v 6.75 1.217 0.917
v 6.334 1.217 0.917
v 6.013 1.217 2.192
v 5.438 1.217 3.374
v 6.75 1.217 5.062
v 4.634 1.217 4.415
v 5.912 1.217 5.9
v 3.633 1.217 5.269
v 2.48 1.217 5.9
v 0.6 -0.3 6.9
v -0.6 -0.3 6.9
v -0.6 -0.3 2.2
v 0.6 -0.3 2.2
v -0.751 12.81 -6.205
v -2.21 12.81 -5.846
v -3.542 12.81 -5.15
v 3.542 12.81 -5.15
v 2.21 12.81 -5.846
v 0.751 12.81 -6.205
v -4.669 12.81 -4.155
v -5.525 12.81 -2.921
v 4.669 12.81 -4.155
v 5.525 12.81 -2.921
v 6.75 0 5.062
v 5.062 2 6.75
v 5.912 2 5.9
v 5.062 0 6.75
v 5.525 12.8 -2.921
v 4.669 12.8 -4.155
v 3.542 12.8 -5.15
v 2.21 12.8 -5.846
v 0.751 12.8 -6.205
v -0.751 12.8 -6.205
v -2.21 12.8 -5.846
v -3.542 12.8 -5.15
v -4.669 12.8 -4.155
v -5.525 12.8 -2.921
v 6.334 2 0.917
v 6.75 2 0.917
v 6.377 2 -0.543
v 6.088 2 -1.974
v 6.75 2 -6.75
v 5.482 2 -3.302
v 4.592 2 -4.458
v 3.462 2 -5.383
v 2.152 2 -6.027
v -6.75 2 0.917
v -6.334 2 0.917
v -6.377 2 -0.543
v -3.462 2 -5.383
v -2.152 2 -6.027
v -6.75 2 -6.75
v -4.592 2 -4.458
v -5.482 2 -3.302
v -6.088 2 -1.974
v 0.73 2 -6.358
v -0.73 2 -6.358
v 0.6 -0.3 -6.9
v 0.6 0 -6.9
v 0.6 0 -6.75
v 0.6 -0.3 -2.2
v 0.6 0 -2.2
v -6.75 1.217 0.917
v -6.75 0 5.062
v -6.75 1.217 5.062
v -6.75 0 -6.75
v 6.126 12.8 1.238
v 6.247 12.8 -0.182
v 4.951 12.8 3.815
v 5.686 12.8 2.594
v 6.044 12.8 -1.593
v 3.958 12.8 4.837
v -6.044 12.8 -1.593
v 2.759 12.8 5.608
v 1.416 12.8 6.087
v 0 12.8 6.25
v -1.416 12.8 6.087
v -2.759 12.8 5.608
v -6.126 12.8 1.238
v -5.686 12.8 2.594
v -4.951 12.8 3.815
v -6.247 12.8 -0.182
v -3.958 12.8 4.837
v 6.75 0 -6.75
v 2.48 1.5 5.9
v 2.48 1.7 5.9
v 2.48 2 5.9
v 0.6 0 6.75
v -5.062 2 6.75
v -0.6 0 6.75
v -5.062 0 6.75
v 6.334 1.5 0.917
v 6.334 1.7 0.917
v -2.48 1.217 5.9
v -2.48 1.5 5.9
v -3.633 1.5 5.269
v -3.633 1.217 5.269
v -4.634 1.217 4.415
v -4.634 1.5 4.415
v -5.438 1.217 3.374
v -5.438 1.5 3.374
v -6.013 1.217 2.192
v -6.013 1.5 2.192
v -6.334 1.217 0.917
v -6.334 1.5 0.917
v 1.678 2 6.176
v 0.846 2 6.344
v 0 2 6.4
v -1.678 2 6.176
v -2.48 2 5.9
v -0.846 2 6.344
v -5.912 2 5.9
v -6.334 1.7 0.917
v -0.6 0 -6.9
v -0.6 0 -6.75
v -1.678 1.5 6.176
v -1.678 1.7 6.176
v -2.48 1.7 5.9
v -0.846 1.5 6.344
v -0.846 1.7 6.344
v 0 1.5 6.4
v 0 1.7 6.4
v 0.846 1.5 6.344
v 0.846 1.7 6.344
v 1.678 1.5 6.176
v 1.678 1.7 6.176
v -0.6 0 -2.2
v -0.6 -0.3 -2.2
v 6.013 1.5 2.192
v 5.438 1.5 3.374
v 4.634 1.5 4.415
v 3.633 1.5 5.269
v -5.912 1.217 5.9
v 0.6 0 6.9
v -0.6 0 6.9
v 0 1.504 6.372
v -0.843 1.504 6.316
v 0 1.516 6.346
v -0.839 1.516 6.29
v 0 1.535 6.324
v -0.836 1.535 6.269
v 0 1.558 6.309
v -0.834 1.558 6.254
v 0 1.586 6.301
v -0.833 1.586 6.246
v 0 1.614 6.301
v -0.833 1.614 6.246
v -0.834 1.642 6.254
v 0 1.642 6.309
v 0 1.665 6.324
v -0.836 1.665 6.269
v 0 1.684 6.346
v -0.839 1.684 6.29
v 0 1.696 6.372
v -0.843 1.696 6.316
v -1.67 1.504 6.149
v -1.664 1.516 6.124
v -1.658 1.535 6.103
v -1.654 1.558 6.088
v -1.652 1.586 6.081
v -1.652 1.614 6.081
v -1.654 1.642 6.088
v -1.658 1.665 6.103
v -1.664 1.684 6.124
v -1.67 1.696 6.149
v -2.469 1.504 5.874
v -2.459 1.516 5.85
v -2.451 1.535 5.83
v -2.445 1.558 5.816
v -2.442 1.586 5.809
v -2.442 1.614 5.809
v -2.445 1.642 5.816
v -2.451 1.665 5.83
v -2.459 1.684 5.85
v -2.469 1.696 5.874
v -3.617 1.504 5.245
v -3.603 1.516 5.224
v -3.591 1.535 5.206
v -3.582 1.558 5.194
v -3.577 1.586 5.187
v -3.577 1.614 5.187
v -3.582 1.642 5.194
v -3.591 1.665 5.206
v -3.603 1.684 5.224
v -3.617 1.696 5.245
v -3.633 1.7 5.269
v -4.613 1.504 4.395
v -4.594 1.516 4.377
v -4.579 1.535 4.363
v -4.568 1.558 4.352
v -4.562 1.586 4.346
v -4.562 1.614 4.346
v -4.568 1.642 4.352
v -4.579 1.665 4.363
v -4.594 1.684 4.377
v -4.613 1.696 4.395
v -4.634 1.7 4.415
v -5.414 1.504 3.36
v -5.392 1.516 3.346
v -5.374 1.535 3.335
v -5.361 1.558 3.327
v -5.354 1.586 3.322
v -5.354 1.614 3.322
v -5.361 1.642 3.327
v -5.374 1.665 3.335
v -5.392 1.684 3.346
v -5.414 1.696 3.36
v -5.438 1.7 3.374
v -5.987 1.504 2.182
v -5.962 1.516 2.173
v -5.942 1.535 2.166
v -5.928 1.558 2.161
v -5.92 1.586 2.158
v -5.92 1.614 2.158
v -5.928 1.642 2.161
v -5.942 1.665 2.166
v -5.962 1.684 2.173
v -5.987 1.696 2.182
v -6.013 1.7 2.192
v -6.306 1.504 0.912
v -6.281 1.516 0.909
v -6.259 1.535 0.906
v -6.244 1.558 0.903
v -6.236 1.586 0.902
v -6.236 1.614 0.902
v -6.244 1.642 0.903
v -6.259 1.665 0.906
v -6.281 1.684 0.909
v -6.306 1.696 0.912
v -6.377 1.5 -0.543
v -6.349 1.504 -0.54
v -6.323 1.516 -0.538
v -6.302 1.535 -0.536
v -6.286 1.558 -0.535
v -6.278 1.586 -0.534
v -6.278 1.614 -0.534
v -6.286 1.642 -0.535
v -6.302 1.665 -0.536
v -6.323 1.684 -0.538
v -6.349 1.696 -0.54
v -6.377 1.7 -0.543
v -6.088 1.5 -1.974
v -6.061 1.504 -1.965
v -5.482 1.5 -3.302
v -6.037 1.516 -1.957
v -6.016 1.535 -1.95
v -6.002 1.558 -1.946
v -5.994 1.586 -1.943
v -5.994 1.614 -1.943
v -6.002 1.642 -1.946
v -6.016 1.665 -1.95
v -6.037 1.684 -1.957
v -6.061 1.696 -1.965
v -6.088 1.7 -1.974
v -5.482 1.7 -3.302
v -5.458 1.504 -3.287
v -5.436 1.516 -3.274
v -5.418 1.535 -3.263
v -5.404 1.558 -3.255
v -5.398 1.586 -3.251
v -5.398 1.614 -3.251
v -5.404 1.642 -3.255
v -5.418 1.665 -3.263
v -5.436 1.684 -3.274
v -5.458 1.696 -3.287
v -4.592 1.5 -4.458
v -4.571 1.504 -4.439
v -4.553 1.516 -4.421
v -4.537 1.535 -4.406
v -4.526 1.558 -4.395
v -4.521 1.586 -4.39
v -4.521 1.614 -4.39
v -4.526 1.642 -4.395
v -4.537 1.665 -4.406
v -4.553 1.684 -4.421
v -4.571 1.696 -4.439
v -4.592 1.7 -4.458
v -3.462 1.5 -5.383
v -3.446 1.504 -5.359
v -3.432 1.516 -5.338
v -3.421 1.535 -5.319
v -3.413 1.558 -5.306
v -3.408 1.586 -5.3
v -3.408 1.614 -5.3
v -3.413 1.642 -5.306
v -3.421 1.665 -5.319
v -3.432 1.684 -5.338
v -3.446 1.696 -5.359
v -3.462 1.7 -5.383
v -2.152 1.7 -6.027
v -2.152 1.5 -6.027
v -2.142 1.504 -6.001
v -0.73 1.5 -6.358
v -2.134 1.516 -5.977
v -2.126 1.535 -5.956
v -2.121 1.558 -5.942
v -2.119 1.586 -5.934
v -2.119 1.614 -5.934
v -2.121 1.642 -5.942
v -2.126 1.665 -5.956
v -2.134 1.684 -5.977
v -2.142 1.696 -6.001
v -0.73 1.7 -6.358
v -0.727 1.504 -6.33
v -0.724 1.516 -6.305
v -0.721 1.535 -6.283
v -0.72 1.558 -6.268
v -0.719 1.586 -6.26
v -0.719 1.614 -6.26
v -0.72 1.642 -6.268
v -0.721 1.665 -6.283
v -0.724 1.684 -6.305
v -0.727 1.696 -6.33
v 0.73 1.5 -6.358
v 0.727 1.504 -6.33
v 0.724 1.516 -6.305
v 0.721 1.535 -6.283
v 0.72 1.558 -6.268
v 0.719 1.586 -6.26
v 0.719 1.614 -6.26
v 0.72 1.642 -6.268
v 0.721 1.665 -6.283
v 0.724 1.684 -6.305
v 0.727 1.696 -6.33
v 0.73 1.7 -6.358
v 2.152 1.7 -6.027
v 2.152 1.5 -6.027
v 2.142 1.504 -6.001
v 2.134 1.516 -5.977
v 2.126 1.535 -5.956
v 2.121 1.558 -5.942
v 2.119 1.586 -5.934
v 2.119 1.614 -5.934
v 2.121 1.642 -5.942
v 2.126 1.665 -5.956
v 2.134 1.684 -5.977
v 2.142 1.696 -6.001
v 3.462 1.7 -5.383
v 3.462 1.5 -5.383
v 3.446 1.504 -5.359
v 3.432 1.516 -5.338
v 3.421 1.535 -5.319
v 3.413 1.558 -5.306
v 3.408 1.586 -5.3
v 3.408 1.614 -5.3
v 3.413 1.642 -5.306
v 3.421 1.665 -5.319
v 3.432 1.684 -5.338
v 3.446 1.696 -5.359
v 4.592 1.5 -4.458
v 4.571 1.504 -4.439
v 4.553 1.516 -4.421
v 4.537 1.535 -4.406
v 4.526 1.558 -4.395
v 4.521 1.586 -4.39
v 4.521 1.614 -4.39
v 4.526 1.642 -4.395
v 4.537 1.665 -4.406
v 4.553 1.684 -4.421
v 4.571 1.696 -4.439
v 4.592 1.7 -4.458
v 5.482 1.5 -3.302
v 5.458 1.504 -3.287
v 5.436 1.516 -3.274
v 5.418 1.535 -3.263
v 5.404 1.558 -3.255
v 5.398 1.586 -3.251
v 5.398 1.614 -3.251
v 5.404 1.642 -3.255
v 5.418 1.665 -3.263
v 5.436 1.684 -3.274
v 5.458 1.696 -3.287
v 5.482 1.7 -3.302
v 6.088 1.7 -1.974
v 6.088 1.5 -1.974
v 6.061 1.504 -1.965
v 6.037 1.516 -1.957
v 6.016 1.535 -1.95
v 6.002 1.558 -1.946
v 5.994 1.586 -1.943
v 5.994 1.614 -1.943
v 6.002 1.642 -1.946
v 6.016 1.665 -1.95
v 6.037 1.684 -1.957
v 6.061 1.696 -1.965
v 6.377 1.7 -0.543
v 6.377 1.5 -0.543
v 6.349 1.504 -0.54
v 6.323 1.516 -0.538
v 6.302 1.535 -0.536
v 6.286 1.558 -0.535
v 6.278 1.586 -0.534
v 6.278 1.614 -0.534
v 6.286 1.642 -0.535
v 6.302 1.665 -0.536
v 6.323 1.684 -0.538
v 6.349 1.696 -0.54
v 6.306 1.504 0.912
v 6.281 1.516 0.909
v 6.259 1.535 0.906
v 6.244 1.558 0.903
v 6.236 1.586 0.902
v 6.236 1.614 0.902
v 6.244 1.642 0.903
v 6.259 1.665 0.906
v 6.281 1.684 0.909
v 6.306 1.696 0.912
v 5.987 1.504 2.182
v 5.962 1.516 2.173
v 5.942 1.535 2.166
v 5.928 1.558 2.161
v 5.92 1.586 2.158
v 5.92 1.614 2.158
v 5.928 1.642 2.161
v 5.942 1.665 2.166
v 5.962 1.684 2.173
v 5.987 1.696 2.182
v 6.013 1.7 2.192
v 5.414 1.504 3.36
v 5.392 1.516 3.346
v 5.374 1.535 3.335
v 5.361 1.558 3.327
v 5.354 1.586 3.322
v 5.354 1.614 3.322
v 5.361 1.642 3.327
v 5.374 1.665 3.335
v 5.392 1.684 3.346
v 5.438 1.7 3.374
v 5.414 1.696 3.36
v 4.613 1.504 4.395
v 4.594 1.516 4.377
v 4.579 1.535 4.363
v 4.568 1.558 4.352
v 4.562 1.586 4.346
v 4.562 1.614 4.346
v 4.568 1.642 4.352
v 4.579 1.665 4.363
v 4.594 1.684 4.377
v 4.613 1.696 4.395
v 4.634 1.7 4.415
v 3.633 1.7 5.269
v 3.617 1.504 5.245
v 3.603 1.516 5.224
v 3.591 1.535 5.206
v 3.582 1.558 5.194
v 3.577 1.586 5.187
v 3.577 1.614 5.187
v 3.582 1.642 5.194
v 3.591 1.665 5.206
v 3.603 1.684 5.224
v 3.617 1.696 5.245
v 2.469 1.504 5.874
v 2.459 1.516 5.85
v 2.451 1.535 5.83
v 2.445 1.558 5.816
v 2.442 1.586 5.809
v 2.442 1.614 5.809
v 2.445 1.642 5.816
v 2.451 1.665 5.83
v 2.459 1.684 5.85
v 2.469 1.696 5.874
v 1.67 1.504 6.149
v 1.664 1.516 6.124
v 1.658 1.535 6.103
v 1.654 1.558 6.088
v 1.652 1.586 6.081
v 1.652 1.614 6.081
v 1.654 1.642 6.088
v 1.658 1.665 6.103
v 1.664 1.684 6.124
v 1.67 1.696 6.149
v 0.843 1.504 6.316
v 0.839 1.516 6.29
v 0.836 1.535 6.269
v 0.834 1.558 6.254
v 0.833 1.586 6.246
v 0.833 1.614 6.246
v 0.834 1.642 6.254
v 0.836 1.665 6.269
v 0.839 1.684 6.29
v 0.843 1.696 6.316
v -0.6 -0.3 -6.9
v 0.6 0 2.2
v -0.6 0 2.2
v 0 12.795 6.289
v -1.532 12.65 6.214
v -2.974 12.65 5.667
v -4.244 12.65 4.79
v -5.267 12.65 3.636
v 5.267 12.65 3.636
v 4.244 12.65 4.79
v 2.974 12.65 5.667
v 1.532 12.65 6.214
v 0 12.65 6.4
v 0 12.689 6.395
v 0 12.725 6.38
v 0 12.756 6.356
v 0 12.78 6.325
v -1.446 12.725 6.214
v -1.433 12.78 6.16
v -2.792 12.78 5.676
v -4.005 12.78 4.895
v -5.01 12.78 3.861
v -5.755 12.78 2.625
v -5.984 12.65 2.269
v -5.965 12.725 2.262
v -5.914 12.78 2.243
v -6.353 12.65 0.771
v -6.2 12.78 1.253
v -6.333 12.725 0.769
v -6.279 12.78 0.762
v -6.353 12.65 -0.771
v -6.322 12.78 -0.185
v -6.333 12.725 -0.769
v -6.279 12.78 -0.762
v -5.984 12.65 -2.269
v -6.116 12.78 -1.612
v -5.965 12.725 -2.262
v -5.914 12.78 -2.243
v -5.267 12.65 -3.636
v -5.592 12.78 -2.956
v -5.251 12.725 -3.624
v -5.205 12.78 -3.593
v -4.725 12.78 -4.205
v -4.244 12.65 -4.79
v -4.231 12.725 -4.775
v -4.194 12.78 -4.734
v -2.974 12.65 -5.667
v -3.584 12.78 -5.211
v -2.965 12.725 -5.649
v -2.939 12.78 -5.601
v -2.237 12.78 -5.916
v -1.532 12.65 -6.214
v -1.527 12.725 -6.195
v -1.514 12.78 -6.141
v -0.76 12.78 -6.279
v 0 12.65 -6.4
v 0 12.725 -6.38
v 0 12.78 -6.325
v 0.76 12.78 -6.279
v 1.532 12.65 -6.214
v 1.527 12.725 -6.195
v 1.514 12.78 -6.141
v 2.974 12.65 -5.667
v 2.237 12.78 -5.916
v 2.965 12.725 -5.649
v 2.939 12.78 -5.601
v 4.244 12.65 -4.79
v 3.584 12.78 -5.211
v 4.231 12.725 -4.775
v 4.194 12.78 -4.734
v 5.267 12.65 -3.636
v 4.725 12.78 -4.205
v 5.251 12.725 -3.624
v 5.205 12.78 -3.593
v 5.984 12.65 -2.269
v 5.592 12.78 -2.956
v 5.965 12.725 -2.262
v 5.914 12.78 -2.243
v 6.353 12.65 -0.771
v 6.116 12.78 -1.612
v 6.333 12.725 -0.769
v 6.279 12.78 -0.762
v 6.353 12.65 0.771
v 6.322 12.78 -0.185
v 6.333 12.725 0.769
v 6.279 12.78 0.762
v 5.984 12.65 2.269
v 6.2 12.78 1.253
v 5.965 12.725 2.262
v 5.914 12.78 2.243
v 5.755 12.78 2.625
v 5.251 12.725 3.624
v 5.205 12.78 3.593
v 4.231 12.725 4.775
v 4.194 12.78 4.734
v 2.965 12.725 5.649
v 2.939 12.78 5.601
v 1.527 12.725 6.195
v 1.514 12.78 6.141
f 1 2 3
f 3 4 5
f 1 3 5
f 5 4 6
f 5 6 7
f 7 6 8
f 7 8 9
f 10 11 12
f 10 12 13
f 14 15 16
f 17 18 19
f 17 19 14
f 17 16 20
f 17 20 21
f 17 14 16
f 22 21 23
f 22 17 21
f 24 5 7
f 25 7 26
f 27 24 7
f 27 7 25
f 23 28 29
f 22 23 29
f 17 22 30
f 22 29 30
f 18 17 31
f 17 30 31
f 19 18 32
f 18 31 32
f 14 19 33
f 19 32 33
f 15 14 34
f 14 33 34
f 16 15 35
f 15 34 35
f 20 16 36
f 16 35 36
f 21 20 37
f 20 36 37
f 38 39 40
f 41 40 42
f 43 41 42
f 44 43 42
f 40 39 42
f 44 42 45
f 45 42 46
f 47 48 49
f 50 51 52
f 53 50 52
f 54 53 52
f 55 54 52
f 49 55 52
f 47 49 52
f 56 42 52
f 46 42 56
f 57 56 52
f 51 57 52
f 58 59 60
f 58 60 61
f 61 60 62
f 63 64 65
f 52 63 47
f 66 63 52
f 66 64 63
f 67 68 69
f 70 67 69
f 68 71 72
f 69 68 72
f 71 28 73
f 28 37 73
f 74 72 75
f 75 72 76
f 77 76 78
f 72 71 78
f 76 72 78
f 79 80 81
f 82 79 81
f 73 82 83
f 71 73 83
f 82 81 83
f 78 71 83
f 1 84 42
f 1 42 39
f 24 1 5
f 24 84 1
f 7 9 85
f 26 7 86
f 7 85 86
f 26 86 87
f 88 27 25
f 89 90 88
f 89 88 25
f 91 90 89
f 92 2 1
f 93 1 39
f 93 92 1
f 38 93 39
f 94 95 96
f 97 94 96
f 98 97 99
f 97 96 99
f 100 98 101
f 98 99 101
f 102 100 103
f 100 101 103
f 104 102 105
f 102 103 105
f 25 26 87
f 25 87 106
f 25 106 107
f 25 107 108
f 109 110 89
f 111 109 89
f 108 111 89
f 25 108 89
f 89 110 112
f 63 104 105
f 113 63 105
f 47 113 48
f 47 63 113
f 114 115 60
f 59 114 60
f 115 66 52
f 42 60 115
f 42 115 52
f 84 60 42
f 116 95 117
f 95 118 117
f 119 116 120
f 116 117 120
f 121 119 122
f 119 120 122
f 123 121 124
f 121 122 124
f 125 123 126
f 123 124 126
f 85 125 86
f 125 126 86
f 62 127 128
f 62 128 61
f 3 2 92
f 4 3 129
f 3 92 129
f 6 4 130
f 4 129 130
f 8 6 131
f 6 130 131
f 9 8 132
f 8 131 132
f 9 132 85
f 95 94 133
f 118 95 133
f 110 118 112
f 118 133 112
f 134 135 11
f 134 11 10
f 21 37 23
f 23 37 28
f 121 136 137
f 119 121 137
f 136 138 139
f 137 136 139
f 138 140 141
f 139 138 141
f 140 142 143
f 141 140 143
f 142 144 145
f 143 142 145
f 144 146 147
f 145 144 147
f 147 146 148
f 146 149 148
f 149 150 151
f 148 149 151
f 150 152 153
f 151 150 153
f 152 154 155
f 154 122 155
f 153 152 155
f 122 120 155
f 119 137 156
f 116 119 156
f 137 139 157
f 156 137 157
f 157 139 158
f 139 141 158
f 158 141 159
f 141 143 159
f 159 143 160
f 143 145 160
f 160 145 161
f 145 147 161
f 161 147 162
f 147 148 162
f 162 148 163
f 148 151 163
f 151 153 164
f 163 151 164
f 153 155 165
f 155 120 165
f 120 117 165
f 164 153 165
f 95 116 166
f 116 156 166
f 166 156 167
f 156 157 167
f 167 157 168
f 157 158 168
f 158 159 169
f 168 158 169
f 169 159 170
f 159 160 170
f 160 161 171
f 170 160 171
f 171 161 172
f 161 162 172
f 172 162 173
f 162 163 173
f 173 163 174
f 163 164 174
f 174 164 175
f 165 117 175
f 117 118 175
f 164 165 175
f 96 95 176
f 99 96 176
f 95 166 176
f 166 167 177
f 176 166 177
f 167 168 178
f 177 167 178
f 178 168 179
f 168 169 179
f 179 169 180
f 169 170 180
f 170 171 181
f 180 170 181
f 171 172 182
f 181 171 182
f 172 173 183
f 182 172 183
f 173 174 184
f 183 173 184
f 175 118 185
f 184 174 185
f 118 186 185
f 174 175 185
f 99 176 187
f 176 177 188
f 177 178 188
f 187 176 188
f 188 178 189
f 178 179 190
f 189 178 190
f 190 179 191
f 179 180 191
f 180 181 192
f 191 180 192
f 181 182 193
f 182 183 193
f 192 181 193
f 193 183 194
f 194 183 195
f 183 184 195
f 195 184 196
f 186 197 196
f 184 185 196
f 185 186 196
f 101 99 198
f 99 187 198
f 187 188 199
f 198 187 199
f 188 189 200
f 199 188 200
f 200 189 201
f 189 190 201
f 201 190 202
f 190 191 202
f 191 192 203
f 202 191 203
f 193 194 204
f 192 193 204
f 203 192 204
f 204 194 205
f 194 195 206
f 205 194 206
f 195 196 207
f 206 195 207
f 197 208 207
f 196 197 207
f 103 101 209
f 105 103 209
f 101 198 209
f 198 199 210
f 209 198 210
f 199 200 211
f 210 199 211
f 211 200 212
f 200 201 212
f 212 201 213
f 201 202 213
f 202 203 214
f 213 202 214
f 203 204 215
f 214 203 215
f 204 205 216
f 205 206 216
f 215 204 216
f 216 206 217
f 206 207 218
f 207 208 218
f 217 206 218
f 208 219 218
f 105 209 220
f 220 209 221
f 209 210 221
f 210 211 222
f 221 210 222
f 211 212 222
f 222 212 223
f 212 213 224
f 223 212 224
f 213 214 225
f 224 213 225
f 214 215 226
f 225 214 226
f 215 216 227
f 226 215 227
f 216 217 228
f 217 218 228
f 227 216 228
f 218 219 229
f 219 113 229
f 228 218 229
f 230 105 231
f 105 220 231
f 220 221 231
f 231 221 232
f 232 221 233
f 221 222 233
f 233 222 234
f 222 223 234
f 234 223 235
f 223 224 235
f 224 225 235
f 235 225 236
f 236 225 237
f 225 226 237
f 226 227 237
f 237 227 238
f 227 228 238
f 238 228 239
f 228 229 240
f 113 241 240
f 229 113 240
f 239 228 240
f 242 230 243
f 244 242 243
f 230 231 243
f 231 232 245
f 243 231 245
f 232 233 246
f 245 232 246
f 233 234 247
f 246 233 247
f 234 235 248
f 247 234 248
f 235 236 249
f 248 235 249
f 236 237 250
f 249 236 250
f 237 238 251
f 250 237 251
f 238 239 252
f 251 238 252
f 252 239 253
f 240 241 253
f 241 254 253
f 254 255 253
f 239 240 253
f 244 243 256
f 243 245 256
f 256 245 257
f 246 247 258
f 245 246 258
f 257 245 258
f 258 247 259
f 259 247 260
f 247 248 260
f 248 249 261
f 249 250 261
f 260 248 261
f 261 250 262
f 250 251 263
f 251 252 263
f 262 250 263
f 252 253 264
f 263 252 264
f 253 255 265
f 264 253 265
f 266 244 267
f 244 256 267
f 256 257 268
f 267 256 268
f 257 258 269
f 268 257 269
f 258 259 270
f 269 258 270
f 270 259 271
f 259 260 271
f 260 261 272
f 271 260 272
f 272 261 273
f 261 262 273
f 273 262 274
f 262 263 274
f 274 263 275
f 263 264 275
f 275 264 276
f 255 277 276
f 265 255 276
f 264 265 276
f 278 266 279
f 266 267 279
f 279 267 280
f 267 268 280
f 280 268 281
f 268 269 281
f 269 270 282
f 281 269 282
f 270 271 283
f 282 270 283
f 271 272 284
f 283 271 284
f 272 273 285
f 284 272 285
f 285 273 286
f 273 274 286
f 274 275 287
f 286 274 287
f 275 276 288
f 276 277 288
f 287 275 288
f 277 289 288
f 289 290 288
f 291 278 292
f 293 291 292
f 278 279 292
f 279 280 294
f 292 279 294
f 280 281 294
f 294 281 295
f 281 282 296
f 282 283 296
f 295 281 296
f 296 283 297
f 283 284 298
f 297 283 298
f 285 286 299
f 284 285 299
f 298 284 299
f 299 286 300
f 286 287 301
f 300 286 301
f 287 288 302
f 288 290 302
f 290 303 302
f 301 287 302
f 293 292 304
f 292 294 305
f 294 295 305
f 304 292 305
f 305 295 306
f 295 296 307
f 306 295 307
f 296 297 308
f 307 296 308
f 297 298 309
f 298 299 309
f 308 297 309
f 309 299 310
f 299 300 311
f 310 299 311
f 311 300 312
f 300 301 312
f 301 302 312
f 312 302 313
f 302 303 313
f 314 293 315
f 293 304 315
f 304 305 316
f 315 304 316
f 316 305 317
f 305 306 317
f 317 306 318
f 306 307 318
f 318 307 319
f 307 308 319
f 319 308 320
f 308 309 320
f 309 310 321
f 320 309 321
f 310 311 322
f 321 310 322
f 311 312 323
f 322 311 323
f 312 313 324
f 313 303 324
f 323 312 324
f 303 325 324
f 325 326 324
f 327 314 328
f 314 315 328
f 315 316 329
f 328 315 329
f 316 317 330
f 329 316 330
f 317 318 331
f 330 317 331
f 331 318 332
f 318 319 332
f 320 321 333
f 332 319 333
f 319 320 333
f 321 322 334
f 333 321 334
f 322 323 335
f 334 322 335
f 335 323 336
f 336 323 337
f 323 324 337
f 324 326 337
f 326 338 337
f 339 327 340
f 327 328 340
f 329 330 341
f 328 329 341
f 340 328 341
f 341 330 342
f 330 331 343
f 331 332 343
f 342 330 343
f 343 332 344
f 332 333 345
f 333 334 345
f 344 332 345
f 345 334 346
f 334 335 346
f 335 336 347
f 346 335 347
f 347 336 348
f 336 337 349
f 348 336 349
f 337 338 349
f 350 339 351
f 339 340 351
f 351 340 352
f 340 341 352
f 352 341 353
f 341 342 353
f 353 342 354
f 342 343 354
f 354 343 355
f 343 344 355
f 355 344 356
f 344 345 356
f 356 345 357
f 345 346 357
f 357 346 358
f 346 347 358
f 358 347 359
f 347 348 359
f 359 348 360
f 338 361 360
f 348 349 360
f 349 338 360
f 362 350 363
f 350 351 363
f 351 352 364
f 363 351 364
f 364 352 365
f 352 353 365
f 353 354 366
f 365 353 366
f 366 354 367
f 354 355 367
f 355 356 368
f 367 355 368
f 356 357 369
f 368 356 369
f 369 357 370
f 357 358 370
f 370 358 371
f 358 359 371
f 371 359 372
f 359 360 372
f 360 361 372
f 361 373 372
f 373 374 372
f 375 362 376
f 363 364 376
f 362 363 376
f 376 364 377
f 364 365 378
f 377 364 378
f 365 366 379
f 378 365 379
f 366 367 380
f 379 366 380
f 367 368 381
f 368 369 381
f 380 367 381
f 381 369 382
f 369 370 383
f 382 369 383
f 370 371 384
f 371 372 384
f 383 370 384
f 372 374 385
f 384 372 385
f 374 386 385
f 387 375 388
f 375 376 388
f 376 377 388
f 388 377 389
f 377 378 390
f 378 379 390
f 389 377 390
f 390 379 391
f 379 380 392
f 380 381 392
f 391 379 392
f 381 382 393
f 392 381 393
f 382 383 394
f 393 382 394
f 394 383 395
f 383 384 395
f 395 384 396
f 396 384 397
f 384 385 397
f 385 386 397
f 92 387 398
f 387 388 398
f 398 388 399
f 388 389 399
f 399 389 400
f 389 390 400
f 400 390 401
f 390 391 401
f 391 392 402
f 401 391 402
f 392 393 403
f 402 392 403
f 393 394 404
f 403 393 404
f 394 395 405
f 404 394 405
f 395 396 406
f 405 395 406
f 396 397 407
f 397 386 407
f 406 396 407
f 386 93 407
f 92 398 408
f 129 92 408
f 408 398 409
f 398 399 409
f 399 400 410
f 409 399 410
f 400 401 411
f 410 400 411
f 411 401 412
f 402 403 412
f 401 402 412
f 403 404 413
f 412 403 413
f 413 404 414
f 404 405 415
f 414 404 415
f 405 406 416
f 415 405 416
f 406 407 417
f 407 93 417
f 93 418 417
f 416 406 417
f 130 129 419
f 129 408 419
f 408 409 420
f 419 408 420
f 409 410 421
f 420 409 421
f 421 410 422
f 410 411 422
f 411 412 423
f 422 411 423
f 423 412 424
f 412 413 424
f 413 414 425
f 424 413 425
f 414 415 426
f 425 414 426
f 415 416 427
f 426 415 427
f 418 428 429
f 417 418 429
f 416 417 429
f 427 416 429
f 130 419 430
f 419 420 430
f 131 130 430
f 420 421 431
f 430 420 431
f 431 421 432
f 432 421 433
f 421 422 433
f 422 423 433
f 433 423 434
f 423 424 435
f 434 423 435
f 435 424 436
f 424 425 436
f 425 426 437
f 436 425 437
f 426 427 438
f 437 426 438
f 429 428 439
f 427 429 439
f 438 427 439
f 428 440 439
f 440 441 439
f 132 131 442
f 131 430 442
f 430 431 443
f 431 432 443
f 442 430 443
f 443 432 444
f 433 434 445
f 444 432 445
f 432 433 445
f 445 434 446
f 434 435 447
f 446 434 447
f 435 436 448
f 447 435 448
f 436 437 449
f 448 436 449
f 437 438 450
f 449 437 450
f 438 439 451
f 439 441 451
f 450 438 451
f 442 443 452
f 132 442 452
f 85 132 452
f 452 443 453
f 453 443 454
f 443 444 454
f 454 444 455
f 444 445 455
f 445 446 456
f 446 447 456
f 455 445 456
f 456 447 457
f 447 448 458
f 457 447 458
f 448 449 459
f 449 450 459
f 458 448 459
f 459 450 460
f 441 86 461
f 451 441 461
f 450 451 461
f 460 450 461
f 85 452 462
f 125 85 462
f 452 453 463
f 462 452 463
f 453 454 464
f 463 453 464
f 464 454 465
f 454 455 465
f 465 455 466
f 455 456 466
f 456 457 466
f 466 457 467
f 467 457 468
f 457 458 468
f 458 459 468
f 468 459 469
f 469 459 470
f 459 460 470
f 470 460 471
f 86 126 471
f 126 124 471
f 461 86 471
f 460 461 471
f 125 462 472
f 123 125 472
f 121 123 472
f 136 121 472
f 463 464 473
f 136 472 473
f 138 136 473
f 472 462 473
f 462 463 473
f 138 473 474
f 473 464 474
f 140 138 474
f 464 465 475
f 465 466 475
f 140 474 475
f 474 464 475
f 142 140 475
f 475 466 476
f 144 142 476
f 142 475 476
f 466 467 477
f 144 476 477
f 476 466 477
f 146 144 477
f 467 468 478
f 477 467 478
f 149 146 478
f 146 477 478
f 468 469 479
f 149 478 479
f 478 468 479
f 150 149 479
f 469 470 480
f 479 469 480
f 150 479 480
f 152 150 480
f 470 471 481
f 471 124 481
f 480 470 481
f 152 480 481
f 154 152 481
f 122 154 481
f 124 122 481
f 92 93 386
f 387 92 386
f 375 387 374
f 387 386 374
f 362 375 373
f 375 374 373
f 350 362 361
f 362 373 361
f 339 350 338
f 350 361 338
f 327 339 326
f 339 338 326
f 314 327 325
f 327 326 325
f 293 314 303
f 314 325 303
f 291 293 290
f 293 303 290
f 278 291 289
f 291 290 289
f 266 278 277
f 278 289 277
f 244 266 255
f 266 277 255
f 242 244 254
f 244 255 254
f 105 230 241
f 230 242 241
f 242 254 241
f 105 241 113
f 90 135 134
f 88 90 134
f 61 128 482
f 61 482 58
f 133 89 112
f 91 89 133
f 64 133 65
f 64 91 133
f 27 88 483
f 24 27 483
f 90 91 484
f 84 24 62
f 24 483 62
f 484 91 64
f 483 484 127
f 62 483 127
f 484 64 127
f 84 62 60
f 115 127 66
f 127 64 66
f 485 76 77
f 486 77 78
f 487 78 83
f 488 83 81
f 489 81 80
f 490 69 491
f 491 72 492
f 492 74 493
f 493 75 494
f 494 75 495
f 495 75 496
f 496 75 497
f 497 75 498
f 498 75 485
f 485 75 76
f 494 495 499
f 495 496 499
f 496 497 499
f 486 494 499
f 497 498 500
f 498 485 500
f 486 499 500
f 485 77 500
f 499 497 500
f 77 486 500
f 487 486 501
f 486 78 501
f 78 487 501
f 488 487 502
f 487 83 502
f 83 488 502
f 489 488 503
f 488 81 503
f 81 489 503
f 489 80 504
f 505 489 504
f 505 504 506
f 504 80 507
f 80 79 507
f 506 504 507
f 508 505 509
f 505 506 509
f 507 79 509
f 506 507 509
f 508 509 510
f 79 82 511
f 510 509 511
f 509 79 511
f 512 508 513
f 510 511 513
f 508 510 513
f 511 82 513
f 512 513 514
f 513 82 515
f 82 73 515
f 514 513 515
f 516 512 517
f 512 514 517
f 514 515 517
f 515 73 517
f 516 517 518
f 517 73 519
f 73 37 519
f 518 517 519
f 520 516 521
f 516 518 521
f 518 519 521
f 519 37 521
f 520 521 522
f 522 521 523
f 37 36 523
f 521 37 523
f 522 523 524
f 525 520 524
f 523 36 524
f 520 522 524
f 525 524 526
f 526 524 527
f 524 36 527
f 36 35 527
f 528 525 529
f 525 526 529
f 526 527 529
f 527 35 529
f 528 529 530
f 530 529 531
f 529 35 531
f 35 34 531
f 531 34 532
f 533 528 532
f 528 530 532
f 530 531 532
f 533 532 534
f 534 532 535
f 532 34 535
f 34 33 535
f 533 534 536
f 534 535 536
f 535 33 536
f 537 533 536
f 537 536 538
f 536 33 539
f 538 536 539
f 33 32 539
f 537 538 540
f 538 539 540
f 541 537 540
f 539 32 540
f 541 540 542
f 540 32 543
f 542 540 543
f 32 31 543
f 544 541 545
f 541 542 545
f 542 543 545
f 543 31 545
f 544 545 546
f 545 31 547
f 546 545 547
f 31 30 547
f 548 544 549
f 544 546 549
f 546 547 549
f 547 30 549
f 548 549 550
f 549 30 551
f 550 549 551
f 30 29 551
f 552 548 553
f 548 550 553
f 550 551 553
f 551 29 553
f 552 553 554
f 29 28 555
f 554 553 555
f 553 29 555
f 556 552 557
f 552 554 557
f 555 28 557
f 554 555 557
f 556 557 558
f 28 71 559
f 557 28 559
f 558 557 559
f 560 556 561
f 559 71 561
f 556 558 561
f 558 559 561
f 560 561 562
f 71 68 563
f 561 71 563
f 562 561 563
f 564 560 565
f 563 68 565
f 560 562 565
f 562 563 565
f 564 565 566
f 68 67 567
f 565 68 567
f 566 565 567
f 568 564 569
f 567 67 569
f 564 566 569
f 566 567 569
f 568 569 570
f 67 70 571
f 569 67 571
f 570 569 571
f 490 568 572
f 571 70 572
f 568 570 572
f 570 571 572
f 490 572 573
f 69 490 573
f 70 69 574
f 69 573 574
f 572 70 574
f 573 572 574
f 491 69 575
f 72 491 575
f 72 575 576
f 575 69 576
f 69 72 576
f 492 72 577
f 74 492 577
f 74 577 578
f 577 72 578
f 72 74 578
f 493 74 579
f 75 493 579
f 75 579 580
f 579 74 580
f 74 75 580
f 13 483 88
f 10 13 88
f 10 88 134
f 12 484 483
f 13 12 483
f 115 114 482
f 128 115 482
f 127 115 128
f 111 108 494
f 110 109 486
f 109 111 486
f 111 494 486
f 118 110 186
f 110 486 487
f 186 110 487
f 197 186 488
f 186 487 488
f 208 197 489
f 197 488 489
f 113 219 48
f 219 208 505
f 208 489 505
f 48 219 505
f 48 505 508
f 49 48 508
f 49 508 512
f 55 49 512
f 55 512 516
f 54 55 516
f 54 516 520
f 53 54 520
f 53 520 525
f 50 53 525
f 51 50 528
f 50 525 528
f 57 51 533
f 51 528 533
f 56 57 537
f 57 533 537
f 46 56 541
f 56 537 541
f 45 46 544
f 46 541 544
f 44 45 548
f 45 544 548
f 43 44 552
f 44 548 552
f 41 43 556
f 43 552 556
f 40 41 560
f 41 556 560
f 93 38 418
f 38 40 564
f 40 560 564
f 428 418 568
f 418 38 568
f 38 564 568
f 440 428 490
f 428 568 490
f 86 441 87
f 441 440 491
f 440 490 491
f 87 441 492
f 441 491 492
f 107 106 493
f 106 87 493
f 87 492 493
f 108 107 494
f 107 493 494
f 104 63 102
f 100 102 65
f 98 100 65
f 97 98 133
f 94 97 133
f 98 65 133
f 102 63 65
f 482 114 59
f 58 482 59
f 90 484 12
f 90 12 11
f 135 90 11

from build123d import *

# Parameters (mm, degrees)
BOSS_EXTRUDE1_DEPTH = 2
SKETCH2_R           = 6.4
CUT_EXTRUDE1_DEPTH  = 1
CUT_EXTRUDE4_REACH  = 17.225
SKETCH8_W           = 4.983499023
SKETCH8_H           = 1.601104922
BOSS_EXTRUDE4_DEPTH = 0.01
SKETCH9_W           = 1.2
SKETCH9_H           = 4.7
BOSS_EXTRUDE5_DEPTH = 0.3


with BuildPart() as part:
    # Sketch1 → Boss-Extrude1 (new body)
    with BuildSketch(Plane(origin=(0, 0, 0), x_dir=(1, 0, 0), z_dir=(0, 1, 0))):
        Polygon((-6.75, 6.75), (6.75, 6.75), (6.75, -5.061772225), (5.061772225, -6.75), (-5.061772225, -6.75), (-6.75, -5.061772225), align=None)
    extrude(amount=BOSS_EXTRUDE1_DEPTH)

    # Sketch2 → Cut-Extrude1 (cut)
    with BuildSketch(Plane(origin=(0, 2, 0), x_dir=(1, 0, 0), z_dir=(0, 1, 0))):
        with Locations(Location((0, 0, 0), (0, 0, 270))):
            Circle(SKETCH2_R)
    extrude(amount=-CUT_EXTRUDE1_DEPTH, mode=Mode.SUBTRACT)

    # Cut-Extrude4: up to this face of the body (flat: up to its plane)
    cut_extrude4_end = Plane(part.part.faces().sort_by_distance((6.75, 1, -0.844113887))[0])
    # Sketch8 → Cut-Extrude4 (cut, up to the picked face)
    with BuildSketch(Plane.ZY.offset(6.75), mode=Mode.PRIVATE) as cut_extrude4_sk1:
        with Locations((3.408264651, 2.017914887)):
            Rectangle(SKETCH8_W, SKETCH8_H)
    cut_extrude4_tool1 = split(extrude(cut_extrude4_sk1.sketch, amount=-CUT_EXTRUDE4_REACH, mode=Mode.PRIVATE), bisect_by=cut_extrude4_end, keep=Keep.BOTH, mode=Mode.PRIVATE)
    add(cut_extrude4_tool1.solids().sort_by(Axis((-6.75, 2.017915, 3.408265), (1, 0, 0)))[0], mode=Mode.SUBTRACT)

    # Sketch5 → Revolve1 (revolve)
    with BuildSketch(Plane.XY, mode=Mode.PRIVATE) as revolve1_sk:
        with BuildLine():
            Line((0, 0), (-6.4, 0))
            Line((-6.4, 0), (-6.4, 1.5))
            ThreePointArc((-6.4, 1.5), (-6.3, 1.6), (-6.4, 1.7))
            Line((-6.4, 1.7), (-6.4, 12.65))
            ThreePointArc((-6.4, 12.65), (-6.356066017, 12.756066017), (-6.25, 12.8))
            Line((-6.25, 12.8), (0, 12.8))
            Line((0, 12.8), (0, 0))
        make_face()
    revolve(revolve1_sk.sketch.rotate(Axis((0, 12.8, 0), (0, -1, 0)), 270), axis=Axis((0, 12.8, 0), (0, -1, 0)))

    # Sketch6 → Boss-Extrude4 (add)
    with BuildSketch(Plane(origin=(0, 12.8, 0), x_dir=(1, 0, 0), z_dir=(0, 1, 0))):
        with BuildLine():
            Line((-5.525359589, 2.921113044), (5.525359589, 2.921113044))
            ThreePointArc((5.525359589, 2.921113044), (0, 6.25), (-5.525359589, 2.921113044))
        make_face()
    extrude(amount=BOSS_EXTRUDE4_DEPTH)

    # Sketch9 → Boss-Extrude5 (add)
    with BuildSketch(Plane.XZ):
        with Locations((0, -4.55)):
            Rectangle(SKETCH9_W, SKETCH9_H)
        with Locations((0, 4.55)):
            Rectangle(SKETCH9_W, SKETCH9_H)
    extrude(amount=BOSS_EXTRUDE5_DEPTH)


solid = part.part
